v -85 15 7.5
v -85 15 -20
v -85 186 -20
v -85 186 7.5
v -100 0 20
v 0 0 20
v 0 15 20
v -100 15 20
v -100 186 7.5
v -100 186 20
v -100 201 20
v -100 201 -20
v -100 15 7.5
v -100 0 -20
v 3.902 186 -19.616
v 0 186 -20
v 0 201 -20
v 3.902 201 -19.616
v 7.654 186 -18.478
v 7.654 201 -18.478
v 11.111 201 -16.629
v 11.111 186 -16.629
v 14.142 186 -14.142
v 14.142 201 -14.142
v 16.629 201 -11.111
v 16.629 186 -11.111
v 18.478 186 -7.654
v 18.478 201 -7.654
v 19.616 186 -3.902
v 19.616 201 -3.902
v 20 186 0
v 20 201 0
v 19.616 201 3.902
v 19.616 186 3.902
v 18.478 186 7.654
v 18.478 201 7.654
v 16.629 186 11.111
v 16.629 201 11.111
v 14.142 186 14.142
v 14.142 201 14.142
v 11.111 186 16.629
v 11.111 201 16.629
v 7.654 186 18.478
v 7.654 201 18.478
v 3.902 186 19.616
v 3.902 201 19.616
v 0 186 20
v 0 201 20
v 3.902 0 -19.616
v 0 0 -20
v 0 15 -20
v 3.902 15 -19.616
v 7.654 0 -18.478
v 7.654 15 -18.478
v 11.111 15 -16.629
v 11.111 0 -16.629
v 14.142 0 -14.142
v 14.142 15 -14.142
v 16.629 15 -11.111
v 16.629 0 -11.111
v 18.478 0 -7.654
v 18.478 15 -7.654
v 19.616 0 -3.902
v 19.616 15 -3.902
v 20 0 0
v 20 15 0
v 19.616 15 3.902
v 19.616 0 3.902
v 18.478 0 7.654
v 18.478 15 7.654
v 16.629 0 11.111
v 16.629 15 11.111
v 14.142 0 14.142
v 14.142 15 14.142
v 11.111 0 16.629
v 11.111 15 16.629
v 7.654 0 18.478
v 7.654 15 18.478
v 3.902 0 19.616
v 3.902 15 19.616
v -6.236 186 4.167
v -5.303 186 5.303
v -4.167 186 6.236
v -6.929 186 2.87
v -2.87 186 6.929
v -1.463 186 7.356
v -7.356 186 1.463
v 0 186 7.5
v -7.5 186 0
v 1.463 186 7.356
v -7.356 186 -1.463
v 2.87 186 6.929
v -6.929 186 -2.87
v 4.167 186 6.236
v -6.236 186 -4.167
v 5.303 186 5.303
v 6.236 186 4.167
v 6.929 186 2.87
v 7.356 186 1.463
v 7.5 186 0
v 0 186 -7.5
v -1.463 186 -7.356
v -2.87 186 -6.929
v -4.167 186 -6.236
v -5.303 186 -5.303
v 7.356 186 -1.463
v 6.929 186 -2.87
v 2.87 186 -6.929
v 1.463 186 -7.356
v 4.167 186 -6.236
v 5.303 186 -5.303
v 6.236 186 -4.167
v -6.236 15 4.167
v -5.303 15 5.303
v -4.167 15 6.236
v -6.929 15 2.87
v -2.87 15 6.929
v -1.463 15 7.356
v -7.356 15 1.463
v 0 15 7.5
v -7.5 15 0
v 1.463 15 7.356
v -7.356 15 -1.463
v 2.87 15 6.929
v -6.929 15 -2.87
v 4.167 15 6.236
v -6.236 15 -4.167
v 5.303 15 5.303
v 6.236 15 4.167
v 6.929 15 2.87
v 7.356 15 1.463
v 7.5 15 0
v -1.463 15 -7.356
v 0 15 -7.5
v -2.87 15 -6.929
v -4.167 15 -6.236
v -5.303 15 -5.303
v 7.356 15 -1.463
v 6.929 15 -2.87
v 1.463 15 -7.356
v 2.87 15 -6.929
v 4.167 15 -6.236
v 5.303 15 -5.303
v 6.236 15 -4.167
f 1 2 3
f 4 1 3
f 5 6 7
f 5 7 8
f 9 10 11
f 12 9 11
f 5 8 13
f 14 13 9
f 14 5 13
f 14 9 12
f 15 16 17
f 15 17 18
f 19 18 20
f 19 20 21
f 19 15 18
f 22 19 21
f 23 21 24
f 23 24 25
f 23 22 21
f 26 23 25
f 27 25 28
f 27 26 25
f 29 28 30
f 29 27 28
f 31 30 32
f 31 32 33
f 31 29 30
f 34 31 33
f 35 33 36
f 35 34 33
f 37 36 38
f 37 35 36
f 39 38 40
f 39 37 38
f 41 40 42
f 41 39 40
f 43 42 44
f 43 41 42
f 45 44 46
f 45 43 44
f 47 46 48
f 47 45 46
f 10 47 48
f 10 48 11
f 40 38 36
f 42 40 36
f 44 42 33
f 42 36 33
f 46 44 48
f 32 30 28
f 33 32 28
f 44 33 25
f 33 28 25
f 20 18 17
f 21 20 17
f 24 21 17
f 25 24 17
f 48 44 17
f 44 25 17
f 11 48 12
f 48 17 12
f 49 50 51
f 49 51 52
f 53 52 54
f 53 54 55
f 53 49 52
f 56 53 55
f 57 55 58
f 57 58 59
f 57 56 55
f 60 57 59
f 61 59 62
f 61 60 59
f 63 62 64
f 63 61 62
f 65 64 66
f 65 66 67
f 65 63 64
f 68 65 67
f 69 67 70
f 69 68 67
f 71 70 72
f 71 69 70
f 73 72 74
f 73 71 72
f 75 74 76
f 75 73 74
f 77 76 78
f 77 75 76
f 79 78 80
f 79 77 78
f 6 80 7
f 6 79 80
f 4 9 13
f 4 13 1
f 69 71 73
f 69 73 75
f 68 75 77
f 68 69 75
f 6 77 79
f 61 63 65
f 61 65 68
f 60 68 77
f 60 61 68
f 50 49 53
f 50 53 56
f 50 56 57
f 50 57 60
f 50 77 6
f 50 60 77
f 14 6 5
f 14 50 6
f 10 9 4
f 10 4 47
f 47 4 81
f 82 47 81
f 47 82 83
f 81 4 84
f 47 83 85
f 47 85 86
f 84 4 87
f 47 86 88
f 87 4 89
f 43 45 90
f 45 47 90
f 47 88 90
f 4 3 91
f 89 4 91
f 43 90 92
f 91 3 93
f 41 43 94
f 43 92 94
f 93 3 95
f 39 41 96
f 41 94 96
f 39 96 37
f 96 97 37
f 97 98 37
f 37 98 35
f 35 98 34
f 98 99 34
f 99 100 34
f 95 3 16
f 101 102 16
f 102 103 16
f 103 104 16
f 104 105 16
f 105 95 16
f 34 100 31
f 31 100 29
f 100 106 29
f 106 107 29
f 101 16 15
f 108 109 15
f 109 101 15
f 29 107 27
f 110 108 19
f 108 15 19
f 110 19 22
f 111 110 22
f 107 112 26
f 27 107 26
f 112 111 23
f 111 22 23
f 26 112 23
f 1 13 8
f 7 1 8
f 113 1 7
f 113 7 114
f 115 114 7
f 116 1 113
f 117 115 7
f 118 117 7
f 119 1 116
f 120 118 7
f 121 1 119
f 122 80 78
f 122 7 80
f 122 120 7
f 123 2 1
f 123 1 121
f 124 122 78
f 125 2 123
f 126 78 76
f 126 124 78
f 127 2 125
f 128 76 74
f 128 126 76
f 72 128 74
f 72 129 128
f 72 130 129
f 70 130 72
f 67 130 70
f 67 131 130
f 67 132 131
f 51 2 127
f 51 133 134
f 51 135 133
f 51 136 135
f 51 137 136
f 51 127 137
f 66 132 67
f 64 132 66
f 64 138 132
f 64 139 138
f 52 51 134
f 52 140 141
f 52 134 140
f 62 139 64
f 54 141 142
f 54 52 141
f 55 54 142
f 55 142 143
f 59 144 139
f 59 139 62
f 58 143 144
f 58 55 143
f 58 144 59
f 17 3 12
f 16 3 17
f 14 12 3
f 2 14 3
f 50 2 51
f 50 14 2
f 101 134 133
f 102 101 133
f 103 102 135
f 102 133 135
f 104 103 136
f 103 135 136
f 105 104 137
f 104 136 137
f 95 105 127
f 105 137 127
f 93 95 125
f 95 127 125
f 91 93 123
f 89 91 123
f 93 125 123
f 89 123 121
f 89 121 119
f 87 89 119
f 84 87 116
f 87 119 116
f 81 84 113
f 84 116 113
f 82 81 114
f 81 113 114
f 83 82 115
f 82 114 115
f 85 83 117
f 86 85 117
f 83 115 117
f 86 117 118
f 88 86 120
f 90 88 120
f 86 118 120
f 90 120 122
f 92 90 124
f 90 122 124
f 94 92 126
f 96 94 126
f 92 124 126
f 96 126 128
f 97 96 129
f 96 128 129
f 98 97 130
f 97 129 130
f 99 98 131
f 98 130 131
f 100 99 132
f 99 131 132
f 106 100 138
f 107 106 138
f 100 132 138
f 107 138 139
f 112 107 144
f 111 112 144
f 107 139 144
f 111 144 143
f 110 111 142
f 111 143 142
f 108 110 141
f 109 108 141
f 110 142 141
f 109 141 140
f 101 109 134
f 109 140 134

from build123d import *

# Parameters (mm, degrees)
BOSS_EXTRUDE1_DEPTH    = 201
CUT_EXTRUDE1_START     = -40
CUT_EXTRUDE1_OUTLINE_W = 106
CUT_EXTRUDE1_OUTLINE_H = 171
CUT_EXTRUDE1_DEPTH     = 40
SKETCH3_R              = 7.5
BOSS_EXTRUDE2_DEPTH    = 171
SKETCH4_W              = 15
SKETCH4_H              = 171
CUT_EXTRUDE2_DEPTH     = 12.5


# Read off the part's stored shape, not the designer's step: Cut-Extrude1
with BuildPart() as part:
    # Sketch1 → Boss-Extrude1 (new body)
    with BuildSketch(Plane(origin=(0, 0, 0), x_dir=(1, 0, 0), z_dir=(0, 1, 0))):
        with BuildLine():
            Line((-100, 20), (0, 20))
            ThreePointArc((0, 20), (20, 0), (0, -20))
            Line((0, -20), (-100, -20))
            Line((-100, -20), (-100, 20))
        make_face()
    extrude(amount=BOSS_EXTRUDE1_DEPTH)

    # Cut-Extrude1 outline → Cut-Extrude1 (cut)
    with BuildSketch(Plane.XY.offset(20).offset(CUT_EXTRUDE1_START)):
        with Locations((-32, 100.5)):
            Rectangle(CUT_EXTRUDE1_OUTLINE_W, CUT_EXTRUDE1_OUTLINE_H)
    extrude(amount=CUT_EXTRUDE1_DEPTH, mode=Mode.SUBTRACT)

    # Sketch3 → Boss-Extrude2 (add)
    with BuildSketch(Plane(origin=(0, 15, 0), x_dir=(1, 0, 0), z_dir=(0, 1, 0))):
        with Locations(Location((0, 0, 0), (0, 0, 90))):
            Circle(SKETCH3_R)
    extrude(amount=BOSS_EXTRUDE2_DEPTH)

    # Sketch4 → Cut-Extrude2 (cut)
    with BuildSketch(Plane.XY.offset(20)):
        with Locations((-92.5, 100.5)):
            Rectangle(SKETCH4_W, SKETCH4_H)
    extrude(amount=-CUT_EXTRUDE2_DEPTH, mode=Mode.SUBTRACT)


solid = part.part
